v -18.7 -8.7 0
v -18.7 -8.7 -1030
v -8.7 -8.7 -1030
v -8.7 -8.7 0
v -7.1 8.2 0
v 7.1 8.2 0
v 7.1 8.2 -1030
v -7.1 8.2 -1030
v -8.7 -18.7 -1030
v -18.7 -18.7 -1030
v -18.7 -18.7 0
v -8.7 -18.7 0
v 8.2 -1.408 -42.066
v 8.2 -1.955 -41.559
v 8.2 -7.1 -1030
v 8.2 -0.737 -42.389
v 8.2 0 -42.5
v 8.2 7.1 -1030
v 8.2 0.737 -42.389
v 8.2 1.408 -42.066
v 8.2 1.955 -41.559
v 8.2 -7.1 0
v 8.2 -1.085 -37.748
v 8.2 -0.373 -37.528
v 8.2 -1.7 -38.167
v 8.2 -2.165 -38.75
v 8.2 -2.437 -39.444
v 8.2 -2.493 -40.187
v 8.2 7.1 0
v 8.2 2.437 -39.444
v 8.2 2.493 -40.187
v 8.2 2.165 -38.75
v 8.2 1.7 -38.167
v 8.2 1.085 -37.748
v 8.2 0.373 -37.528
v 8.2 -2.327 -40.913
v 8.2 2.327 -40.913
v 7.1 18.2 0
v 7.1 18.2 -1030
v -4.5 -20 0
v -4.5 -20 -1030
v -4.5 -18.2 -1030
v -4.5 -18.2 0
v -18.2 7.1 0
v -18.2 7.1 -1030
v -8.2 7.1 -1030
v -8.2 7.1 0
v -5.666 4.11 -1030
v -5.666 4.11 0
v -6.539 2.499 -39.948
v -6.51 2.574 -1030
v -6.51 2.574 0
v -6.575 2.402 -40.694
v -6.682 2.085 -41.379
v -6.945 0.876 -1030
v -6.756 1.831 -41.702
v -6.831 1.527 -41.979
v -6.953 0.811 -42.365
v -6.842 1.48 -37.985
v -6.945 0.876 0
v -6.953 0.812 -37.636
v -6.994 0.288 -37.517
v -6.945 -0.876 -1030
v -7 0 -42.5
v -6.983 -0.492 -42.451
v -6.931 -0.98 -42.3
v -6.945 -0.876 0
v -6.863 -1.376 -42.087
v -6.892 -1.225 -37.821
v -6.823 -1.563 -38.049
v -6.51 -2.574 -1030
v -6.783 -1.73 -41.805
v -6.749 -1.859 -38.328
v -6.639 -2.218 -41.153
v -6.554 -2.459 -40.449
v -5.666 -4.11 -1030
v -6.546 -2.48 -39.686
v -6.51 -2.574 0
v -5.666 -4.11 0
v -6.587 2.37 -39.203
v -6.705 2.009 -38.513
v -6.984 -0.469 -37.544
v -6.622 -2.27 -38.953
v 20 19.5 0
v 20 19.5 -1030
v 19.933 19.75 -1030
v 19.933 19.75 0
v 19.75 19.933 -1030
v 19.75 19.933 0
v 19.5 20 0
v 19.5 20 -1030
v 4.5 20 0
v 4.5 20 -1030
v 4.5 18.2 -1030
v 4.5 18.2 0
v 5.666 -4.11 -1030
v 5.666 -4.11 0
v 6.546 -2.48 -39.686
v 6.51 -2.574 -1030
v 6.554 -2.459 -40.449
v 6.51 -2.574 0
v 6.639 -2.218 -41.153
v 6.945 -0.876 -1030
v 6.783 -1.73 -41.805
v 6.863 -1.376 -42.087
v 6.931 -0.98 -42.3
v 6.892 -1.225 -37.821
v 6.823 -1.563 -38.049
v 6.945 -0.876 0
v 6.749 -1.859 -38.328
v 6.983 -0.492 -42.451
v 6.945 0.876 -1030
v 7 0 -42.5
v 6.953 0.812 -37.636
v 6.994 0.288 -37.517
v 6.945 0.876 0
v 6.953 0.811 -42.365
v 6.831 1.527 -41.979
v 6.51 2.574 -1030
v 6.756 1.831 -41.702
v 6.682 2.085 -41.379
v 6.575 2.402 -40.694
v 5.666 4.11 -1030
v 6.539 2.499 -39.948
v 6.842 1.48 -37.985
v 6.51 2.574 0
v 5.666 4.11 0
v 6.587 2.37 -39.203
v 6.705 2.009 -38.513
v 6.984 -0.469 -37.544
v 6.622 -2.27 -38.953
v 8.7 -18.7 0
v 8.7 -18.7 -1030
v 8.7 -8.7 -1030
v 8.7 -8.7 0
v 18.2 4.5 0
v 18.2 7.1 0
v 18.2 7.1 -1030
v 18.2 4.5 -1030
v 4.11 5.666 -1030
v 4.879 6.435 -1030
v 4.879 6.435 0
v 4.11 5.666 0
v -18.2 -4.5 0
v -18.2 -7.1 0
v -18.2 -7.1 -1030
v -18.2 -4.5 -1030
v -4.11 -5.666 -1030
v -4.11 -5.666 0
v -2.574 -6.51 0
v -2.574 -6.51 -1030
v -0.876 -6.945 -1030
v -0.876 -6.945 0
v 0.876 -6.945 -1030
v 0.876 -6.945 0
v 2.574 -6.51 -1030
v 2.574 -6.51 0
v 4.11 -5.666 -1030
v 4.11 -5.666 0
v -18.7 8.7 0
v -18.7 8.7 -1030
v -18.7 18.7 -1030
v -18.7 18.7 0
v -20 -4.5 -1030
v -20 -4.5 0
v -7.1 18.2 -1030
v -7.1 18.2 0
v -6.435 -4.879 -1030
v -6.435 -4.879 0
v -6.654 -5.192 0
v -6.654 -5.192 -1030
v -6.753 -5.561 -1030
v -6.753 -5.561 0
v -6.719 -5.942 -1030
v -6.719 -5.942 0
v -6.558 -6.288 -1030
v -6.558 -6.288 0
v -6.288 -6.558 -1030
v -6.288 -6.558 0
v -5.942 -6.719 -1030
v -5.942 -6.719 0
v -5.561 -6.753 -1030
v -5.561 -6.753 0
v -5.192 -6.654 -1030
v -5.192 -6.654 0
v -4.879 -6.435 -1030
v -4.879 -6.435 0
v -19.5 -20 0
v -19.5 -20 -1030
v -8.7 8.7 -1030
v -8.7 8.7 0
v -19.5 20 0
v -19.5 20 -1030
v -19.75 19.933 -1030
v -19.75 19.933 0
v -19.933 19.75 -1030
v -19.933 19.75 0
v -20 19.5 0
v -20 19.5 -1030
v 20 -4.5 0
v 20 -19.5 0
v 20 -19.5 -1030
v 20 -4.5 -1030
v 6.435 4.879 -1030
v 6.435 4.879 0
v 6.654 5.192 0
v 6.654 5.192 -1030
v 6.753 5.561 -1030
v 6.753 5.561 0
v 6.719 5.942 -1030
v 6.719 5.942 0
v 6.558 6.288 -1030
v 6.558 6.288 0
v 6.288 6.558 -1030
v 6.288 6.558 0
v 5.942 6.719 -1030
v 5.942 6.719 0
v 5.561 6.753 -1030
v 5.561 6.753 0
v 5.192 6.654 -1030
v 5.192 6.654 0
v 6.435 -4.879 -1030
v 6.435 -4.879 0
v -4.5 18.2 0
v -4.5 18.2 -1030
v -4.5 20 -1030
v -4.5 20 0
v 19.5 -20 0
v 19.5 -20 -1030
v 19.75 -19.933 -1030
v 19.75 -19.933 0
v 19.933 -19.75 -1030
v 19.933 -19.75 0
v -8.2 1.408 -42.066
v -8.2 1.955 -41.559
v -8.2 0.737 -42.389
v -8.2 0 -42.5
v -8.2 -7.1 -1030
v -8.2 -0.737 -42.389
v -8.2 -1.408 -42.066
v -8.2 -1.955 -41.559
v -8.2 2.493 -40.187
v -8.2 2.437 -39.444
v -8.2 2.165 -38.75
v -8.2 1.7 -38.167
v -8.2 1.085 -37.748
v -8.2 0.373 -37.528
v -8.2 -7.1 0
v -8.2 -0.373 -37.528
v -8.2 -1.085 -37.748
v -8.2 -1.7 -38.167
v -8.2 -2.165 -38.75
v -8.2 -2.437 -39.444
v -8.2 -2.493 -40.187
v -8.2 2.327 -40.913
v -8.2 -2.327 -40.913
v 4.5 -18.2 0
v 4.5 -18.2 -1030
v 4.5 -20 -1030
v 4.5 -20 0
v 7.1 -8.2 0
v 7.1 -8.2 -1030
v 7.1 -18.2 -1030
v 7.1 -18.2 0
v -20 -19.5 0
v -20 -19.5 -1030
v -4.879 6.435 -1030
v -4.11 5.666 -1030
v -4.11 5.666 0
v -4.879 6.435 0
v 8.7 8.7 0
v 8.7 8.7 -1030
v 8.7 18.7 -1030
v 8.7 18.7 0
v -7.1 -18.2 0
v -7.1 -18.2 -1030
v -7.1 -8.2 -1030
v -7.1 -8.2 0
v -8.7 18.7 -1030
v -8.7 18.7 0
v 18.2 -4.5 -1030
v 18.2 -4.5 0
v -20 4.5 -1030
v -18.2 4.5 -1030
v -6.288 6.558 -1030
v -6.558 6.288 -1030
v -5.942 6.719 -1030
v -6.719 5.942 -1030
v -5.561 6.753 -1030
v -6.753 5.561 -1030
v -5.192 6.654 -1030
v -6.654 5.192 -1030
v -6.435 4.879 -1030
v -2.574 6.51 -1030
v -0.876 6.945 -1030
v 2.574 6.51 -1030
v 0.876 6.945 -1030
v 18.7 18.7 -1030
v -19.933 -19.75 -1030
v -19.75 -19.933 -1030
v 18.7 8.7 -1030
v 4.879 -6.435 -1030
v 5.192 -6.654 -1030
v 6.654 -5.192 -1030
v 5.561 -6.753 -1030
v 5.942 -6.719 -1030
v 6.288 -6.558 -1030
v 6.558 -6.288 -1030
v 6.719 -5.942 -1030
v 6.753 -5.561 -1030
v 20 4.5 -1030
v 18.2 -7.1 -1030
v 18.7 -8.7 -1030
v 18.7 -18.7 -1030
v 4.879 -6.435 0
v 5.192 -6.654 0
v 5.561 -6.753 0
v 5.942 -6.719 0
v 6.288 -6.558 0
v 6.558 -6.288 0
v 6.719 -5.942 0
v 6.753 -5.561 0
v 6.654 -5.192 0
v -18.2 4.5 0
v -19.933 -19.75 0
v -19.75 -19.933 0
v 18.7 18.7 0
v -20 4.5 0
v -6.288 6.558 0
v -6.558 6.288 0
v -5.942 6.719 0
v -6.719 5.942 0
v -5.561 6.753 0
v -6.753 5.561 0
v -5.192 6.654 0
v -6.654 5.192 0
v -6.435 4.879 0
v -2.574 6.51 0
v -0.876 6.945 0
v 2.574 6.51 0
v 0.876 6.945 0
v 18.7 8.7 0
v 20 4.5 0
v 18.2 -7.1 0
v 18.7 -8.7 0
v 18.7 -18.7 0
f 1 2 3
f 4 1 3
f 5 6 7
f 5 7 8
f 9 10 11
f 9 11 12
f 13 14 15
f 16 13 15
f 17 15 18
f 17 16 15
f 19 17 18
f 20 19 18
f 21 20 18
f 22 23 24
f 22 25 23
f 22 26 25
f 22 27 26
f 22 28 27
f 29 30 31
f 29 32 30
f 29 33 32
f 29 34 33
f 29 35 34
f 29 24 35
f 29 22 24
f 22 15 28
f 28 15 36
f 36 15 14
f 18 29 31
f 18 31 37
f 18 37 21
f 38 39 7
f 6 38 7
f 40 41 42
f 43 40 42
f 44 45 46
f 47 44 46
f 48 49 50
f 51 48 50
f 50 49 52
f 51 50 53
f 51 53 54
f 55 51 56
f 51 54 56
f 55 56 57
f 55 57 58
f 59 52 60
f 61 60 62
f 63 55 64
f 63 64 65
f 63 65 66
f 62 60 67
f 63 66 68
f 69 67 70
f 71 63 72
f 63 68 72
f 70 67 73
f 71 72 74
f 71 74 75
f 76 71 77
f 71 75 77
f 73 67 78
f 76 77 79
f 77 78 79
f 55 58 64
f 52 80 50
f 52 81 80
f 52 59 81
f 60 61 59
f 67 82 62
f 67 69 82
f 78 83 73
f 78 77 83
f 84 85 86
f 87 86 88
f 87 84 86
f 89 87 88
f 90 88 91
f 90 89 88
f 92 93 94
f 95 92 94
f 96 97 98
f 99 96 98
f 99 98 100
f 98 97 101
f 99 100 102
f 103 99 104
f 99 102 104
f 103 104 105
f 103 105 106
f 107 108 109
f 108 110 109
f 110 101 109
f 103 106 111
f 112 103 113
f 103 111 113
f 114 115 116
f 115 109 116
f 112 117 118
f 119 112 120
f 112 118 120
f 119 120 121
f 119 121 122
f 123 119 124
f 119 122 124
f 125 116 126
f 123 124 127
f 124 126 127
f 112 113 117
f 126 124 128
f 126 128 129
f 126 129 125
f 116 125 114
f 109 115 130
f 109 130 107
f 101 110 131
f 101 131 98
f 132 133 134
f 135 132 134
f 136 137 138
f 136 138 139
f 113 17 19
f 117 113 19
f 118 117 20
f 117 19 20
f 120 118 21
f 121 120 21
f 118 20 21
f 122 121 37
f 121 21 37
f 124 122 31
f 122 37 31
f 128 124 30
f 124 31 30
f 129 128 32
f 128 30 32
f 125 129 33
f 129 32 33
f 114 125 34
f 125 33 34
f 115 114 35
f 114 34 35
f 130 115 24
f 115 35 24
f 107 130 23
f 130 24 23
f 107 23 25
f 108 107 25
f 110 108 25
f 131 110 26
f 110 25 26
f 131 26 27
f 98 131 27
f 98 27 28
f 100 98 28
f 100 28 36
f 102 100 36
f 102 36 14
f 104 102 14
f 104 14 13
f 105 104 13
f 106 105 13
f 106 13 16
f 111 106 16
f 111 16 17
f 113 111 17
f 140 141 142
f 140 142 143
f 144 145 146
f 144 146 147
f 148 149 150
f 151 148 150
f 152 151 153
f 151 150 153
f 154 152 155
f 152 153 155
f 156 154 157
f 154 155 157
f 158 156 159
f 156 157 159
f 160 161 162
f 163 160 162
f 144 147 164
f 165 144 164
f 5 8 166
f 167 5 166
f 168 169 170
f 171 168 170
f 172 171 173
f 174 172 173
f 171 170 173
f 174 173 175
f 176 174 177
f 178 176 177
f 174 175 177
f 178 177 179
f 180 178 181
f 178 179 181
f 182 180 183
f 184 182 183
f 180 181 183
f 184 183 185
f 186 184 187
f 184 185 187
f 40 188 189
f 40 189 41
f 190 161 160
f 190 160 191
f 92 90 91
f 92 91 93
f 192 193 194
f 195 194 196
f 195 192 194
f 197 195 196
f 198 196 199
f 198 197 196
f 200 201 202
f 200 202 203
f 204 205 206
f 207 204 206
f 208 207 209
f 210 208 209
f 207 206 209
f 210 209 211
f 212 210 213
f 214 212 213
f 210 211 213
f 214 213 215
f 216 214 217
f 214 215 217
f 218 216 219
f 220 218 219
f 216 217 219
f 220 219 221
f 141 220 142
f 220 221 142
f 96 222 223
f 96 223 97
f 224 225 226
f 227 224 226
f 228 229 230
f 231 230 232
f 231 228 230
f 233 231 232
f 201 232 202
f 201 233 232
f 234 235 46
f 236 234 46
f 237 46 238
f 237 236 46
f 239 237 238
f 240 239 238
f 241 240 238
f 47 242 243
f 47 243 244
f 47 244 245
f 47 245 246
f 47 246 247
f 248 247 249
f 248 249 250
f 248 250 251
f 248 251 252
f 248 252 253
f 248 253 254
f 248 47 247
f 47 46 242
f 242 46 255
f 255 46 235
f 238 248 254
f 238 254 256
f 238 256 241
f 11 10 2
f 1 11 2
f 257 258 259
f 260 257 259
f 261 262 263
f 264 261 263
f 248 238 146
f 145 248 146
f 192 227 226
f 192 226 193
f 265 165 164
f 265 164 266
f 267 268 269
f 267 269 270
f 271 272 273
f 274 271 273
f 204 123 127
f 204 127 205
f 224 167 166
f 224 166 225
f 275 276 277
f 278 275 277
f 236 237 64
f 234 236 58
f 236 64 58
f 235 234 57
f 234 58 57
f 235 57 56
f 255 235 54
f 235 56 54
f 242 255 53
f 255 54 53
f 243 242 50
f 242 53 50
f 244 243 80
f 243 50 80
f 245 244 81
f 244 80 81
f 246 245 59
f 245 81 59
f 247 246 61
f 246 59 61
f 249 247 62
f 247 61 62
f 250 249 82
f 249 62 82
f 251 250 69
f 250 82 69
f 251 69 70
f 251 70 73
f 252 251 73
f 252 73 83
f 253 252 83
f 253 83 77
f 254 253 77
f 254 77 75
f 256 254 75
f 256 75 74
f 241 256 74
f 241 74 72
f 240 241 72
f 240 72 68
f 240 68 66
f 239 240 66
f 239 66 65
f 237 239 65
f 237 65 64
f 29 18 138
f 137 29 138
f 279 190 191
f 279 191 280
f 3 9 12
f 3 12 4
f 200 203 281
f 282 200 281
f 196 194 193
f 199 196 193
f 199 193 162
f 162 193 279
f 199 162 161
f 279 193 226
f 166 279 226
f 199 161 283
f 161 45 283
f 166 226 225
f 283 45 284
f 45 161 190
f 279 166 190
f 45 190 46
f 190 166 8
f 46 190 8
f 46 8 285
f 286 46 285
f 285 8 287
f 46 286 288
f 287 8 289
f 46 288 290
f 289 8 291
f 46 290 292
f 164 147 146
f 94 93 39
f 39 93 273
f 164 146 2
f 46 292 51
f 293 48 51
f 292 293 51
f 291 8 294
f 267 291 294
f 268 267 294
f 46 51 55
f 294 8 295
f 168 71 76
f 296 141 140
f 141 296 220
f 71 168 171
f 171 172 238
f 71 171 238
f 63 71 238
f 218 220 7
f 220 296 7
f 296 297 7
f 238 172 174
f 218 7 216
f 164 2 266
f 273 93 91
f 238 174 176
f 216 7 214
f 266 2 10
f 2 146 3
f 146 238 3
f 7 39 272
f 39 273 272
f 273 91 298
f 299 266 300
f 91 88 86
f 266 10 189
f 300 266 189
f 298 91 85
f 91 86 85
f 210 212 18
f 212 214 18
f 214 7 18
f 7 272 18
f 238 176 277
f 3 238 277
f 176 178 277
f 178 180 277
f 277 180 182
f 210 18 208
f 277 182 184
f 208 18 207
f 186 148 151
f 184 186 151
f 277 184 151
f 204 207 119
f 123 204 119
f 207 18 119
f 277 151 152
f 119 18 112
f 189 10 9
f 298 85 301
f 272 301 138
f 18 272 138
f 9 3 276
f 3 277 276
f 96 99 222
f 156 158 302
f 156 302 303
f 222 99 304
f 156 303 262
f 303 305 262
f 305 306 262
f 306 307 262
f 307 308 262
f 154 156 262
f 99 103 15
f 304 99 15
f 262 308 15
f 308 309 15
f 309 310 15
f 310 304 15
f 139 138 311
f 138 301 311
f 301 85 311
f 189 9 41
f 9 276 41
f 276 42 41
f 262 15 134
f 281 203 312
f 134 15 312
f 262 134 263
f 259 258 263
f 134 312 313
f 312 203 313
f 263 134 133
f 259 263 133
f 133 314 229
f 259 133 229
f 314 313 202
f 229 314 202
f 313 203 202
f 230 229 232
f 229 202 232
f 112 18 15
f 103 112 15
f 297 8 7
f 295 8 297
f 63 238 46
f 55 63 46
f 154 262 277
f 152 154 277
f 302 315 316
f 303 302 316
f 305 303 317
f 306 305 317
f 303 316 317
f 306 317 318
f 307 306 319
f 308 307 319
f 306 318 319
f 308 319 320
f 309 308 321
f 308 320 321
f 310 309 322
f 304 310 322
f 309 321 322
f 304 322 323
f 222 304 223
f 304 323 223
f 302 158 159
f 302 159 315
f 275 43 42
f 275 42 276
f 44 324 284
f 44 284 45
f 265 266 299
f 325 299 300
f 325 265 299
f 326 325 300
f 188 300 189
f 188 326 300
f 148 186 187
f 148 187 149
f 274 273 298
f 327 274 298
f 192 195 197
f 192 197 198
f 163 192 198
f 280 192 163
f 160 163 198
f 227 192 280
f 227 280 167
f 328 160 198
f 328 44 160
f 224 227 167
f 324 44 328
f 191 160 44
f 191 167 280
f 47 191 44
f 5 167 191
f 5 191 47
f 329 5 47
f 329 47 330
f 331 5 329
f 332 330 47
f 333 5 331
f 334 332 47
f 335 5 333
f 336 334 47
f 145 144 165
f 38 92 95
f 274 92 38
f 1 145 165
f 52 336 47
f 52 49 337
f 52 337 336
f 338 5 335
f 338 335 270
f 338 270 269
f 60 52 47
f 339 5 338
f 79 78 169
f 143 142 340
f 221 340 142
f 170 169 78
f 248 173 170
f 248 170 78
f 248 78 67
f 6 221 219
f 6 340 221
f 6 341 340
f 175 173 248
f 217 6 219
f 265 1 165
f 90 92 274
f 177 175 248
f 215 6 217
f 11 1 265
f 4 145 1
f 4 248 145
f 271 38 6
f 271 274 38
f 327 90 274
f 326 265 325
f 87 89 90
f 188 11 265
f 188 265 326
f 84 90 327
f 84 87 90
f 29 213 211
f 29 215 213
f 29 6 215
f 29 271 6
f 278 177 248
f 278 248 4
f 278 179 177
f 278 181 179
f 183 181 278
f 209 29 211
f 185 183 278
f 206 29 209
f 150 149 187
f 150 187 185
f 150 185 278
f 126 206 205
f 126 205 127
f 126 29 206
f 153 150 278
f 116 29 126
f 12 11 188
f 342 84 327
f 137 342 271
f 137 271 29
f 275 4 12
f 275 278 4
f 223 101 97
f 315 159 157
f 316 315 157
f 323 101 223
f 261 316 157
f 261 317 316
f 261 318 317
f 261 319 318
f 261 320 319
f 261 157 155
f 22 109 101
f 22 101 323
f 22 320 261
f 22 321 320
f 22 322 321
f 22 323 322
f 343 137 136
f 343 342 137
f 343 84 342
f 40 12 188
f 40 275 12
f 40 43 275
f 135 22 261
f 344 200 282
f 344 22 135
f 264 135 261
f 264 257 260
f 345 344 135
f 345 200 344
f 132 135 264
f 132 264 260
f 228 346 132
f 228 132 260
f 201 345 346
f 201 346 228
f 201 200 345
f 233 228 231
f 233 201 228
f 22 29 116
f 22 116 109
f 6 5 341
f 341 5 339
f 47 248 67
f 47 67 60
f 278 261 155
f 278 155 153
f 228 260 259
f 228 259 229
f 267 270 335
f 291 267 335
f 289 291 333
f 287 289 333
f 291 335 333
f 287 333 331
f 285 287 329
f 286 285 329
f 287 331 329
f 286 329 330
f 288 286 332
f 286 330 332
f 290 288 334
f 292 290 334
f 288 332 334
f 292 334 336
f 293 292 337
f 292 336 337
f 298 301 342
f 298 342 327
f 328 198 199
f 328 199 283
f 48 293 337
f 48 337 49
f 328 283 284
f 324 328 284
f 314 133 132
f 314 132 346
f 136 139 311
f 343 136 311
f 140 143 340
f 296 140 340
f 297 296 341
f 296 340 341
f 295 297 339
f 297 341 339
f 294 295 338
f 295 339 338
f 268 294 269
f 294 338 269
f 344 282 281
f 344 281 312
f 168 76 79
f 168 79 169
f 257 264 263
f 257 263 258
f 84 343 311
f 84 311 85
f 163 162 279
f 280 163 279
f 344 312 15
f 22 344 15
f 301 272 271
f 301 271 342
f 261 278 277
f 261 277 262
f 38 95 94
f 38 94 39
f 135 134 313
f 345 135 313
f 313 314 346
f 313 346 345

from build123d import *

# Parameters (mm, degrees)
SKETCH1_W                 = 10
SKETCH1_H                 = 10
F_40_X_40A_X_R0_5_1_DEPTH = 1030
SKETCH_2_R                = 2.5
CUT_EXTRUDE_1_DEPTH       = 1031.580050263


with BuildPart() as part:
    # Sketch1 → 铝型材 40 X 40A X R0.5(1) (new body)
    with BuildSketch(Plane.YX):
        with BuildLine():
            Line((-19.5, 20), (-4.5, 20))
            Line((-4.5, 20), (-4.5, 18.2))
            Line((-4.5, 18.2), (-7.1, 18.2))
            Line((-7.1, 18.2), (-7.1, 8.2))
            Line((-7.1, 8.2), (7.1, 8.2))
            Line((7.1, 8.2), (7.1, 18.2))
            Line((7.1, 18.2), (4.5, 18.2))
            Line((4.5, 18.2), (4.5, 20))
            Line((4.5, 20), (19.5, 20))
            ThreePointArc((19.5, 20), (19.853553391, 19.853553391), (20, 19.5))
            Line((20, 19.5), (20, 4.5))
            Line((20, 4.5), (18.2, 4.5))
            Line((18.2, 4.5), (18.2, 7.1))
            Line((18.2, 7.1), (8.2, 7.1))
            Line((8.2, 7.1), (8.2, -7.1))
            Line((8.2, -7.1), (18.2, -7.1))
            Line((18.2, -7.1), (18.2, -4.5))
            Line((18.2, -4.5), (20, -4.5))
            Line((20, -4.5), (20, -19.5))
            ThreePointArc((20, -19.5), (19.853553391, -19.853553391), (19.5, -20))
            Line((19.5, -20), (4.5, -20))
            Line((4.5, -20), (4.5, -18.2))
            Line((4.5, -18.2), (7.1, -18.2))
            Line((7.1, -18.2), (7.1, -8.2))
            Line((7.1, -8.2), (-7.1, -8.2))
            Line((-7.1, -8.2), (-7.1, -18.2))
            Line((-7.1, -18.2), (-4.5, -18.2))
            Line((-4.5, -18.2), (-4.5, -20))
            Line((-4.5, -20), (-19.5, -20))
            ThreePointArc((-19.5, -20), (-19.853553391, -19.853553391), (-20, -19.5))
            Line((-20, -19.5), (-20, -4.5))
            Line((-20, -4.5), (-18.2, -4.5))
            Line((-18.2, -4.5), (-18.2, -7.1))
            Line((-18.2, -7.1), (-8.2, -7.1))
            Line((-8.2, -7.1), (-8.2, 7.1))
            Line((-8.2, 7.1), (-18.2, 7.1))
            Line((-18.2, 7.1), (-18.2, 4.5))
            Line((-18.2, 4.5), (-20, 4.5))
            Line((-20, 4.5), (-20, 19.5))
            ThreePointArc((-20, 19.5), (-19.853553391, 19.853553391), (-19.5, 20))
        make_face()
        with BuildLine():
            Line((-4.87903679, 6.434671709), (-4.110433762, 5.66606868))
            ThreePointArc((-4.110433762, 5.66606868), (0, 7), (4.110433762, 5.66606868))
            Line((4.110433762, 5.66606868), (4.87903679, 6.434671709))
            ThreePointArc((4.87903679, 6.434671709), (6.434671709, 6.434671709), (6.434671709, 4.87903679))
            Line((6.434671709, 4.87903679), (5.66606868, 4.110433762))
            ThreePointArc((5.66606868, 4.110433762), (7, 0), (5.66606868, -4.110433762))
            Line((5.66606868, -4.110433762), (6.434671709, -4.87903679))
            ThreePointArc((6.434671709, -4.87903679), (6.434671709, -6.434671709), (4.87903679, -6.434671709))
            Line((4.87903679, -6.434671709), (4.110433762, -5.66606868))
            ThreePointArc((4.110433762, -5.66606868), (0, -7), (-4.110433762, -5.66606868))
            Line((-4.110433762, -5.66606868), (-4.87903679, -6.434671709))
            ThreePointArc((-4.87903679, -6.434671709), (-6.434671709, -6.434671709), (-6.434671709, -4.87903679))
            Line((-6.434671709, -4.87903679), (-5.66606868, -4.110433762))
            ThreePointArc((-5.66606868, -4.110433762), (-7, 0), (-5.66606868, 4.110433762))
            Line((-5.66606868, 4.110433762), (-6.434671709, 4.87903679))
            ThreePointArc((-6.434671709, 4.87903679), (-6.434671709, 6.434671709), (-4.87903679, 6.434671709))
        make_face(mode=Mode.SUBTRACT)
        with Locations((-13.7, 13.7)):
            Rectangle(SKETCH1_W, SKETCH1_H, mode=Mode.SUBTRACT)
        with Locations((13.7, 13.7)):
            Rectangle(SKETCH1_W, SKETCH1_H, mode=Mode.SUBTRACT)
        with Locations((13.7, -13.7)):
            Rectangle(SKETCH1_W, SKETCH1_H, mode=Mode.SUBTRACT)
        with Locations((-13.7, -13.7)):
            Rectangle(SKETCH1_W, SKETCH1_H, mode=Mode.SUBTRACT)
    extrude(amount=F_40_X_40A_X_R0_5_1_DEPTH)

    # 草图2 → 切除-拉伸1 (cut, through all)
    with BuildSketch(Plane(origin=(8.2, 0, 0), x_dir=(0, 0, -1), z_dir=(1, 0, 0))):
        with Locations((40, 0)):
            Circle(SKETCH_2_R)
    extrude(amount=-CUT_EXTRUDE_1_DEPTH, mode=Mode.SUBTRACT)


solid = part.part
